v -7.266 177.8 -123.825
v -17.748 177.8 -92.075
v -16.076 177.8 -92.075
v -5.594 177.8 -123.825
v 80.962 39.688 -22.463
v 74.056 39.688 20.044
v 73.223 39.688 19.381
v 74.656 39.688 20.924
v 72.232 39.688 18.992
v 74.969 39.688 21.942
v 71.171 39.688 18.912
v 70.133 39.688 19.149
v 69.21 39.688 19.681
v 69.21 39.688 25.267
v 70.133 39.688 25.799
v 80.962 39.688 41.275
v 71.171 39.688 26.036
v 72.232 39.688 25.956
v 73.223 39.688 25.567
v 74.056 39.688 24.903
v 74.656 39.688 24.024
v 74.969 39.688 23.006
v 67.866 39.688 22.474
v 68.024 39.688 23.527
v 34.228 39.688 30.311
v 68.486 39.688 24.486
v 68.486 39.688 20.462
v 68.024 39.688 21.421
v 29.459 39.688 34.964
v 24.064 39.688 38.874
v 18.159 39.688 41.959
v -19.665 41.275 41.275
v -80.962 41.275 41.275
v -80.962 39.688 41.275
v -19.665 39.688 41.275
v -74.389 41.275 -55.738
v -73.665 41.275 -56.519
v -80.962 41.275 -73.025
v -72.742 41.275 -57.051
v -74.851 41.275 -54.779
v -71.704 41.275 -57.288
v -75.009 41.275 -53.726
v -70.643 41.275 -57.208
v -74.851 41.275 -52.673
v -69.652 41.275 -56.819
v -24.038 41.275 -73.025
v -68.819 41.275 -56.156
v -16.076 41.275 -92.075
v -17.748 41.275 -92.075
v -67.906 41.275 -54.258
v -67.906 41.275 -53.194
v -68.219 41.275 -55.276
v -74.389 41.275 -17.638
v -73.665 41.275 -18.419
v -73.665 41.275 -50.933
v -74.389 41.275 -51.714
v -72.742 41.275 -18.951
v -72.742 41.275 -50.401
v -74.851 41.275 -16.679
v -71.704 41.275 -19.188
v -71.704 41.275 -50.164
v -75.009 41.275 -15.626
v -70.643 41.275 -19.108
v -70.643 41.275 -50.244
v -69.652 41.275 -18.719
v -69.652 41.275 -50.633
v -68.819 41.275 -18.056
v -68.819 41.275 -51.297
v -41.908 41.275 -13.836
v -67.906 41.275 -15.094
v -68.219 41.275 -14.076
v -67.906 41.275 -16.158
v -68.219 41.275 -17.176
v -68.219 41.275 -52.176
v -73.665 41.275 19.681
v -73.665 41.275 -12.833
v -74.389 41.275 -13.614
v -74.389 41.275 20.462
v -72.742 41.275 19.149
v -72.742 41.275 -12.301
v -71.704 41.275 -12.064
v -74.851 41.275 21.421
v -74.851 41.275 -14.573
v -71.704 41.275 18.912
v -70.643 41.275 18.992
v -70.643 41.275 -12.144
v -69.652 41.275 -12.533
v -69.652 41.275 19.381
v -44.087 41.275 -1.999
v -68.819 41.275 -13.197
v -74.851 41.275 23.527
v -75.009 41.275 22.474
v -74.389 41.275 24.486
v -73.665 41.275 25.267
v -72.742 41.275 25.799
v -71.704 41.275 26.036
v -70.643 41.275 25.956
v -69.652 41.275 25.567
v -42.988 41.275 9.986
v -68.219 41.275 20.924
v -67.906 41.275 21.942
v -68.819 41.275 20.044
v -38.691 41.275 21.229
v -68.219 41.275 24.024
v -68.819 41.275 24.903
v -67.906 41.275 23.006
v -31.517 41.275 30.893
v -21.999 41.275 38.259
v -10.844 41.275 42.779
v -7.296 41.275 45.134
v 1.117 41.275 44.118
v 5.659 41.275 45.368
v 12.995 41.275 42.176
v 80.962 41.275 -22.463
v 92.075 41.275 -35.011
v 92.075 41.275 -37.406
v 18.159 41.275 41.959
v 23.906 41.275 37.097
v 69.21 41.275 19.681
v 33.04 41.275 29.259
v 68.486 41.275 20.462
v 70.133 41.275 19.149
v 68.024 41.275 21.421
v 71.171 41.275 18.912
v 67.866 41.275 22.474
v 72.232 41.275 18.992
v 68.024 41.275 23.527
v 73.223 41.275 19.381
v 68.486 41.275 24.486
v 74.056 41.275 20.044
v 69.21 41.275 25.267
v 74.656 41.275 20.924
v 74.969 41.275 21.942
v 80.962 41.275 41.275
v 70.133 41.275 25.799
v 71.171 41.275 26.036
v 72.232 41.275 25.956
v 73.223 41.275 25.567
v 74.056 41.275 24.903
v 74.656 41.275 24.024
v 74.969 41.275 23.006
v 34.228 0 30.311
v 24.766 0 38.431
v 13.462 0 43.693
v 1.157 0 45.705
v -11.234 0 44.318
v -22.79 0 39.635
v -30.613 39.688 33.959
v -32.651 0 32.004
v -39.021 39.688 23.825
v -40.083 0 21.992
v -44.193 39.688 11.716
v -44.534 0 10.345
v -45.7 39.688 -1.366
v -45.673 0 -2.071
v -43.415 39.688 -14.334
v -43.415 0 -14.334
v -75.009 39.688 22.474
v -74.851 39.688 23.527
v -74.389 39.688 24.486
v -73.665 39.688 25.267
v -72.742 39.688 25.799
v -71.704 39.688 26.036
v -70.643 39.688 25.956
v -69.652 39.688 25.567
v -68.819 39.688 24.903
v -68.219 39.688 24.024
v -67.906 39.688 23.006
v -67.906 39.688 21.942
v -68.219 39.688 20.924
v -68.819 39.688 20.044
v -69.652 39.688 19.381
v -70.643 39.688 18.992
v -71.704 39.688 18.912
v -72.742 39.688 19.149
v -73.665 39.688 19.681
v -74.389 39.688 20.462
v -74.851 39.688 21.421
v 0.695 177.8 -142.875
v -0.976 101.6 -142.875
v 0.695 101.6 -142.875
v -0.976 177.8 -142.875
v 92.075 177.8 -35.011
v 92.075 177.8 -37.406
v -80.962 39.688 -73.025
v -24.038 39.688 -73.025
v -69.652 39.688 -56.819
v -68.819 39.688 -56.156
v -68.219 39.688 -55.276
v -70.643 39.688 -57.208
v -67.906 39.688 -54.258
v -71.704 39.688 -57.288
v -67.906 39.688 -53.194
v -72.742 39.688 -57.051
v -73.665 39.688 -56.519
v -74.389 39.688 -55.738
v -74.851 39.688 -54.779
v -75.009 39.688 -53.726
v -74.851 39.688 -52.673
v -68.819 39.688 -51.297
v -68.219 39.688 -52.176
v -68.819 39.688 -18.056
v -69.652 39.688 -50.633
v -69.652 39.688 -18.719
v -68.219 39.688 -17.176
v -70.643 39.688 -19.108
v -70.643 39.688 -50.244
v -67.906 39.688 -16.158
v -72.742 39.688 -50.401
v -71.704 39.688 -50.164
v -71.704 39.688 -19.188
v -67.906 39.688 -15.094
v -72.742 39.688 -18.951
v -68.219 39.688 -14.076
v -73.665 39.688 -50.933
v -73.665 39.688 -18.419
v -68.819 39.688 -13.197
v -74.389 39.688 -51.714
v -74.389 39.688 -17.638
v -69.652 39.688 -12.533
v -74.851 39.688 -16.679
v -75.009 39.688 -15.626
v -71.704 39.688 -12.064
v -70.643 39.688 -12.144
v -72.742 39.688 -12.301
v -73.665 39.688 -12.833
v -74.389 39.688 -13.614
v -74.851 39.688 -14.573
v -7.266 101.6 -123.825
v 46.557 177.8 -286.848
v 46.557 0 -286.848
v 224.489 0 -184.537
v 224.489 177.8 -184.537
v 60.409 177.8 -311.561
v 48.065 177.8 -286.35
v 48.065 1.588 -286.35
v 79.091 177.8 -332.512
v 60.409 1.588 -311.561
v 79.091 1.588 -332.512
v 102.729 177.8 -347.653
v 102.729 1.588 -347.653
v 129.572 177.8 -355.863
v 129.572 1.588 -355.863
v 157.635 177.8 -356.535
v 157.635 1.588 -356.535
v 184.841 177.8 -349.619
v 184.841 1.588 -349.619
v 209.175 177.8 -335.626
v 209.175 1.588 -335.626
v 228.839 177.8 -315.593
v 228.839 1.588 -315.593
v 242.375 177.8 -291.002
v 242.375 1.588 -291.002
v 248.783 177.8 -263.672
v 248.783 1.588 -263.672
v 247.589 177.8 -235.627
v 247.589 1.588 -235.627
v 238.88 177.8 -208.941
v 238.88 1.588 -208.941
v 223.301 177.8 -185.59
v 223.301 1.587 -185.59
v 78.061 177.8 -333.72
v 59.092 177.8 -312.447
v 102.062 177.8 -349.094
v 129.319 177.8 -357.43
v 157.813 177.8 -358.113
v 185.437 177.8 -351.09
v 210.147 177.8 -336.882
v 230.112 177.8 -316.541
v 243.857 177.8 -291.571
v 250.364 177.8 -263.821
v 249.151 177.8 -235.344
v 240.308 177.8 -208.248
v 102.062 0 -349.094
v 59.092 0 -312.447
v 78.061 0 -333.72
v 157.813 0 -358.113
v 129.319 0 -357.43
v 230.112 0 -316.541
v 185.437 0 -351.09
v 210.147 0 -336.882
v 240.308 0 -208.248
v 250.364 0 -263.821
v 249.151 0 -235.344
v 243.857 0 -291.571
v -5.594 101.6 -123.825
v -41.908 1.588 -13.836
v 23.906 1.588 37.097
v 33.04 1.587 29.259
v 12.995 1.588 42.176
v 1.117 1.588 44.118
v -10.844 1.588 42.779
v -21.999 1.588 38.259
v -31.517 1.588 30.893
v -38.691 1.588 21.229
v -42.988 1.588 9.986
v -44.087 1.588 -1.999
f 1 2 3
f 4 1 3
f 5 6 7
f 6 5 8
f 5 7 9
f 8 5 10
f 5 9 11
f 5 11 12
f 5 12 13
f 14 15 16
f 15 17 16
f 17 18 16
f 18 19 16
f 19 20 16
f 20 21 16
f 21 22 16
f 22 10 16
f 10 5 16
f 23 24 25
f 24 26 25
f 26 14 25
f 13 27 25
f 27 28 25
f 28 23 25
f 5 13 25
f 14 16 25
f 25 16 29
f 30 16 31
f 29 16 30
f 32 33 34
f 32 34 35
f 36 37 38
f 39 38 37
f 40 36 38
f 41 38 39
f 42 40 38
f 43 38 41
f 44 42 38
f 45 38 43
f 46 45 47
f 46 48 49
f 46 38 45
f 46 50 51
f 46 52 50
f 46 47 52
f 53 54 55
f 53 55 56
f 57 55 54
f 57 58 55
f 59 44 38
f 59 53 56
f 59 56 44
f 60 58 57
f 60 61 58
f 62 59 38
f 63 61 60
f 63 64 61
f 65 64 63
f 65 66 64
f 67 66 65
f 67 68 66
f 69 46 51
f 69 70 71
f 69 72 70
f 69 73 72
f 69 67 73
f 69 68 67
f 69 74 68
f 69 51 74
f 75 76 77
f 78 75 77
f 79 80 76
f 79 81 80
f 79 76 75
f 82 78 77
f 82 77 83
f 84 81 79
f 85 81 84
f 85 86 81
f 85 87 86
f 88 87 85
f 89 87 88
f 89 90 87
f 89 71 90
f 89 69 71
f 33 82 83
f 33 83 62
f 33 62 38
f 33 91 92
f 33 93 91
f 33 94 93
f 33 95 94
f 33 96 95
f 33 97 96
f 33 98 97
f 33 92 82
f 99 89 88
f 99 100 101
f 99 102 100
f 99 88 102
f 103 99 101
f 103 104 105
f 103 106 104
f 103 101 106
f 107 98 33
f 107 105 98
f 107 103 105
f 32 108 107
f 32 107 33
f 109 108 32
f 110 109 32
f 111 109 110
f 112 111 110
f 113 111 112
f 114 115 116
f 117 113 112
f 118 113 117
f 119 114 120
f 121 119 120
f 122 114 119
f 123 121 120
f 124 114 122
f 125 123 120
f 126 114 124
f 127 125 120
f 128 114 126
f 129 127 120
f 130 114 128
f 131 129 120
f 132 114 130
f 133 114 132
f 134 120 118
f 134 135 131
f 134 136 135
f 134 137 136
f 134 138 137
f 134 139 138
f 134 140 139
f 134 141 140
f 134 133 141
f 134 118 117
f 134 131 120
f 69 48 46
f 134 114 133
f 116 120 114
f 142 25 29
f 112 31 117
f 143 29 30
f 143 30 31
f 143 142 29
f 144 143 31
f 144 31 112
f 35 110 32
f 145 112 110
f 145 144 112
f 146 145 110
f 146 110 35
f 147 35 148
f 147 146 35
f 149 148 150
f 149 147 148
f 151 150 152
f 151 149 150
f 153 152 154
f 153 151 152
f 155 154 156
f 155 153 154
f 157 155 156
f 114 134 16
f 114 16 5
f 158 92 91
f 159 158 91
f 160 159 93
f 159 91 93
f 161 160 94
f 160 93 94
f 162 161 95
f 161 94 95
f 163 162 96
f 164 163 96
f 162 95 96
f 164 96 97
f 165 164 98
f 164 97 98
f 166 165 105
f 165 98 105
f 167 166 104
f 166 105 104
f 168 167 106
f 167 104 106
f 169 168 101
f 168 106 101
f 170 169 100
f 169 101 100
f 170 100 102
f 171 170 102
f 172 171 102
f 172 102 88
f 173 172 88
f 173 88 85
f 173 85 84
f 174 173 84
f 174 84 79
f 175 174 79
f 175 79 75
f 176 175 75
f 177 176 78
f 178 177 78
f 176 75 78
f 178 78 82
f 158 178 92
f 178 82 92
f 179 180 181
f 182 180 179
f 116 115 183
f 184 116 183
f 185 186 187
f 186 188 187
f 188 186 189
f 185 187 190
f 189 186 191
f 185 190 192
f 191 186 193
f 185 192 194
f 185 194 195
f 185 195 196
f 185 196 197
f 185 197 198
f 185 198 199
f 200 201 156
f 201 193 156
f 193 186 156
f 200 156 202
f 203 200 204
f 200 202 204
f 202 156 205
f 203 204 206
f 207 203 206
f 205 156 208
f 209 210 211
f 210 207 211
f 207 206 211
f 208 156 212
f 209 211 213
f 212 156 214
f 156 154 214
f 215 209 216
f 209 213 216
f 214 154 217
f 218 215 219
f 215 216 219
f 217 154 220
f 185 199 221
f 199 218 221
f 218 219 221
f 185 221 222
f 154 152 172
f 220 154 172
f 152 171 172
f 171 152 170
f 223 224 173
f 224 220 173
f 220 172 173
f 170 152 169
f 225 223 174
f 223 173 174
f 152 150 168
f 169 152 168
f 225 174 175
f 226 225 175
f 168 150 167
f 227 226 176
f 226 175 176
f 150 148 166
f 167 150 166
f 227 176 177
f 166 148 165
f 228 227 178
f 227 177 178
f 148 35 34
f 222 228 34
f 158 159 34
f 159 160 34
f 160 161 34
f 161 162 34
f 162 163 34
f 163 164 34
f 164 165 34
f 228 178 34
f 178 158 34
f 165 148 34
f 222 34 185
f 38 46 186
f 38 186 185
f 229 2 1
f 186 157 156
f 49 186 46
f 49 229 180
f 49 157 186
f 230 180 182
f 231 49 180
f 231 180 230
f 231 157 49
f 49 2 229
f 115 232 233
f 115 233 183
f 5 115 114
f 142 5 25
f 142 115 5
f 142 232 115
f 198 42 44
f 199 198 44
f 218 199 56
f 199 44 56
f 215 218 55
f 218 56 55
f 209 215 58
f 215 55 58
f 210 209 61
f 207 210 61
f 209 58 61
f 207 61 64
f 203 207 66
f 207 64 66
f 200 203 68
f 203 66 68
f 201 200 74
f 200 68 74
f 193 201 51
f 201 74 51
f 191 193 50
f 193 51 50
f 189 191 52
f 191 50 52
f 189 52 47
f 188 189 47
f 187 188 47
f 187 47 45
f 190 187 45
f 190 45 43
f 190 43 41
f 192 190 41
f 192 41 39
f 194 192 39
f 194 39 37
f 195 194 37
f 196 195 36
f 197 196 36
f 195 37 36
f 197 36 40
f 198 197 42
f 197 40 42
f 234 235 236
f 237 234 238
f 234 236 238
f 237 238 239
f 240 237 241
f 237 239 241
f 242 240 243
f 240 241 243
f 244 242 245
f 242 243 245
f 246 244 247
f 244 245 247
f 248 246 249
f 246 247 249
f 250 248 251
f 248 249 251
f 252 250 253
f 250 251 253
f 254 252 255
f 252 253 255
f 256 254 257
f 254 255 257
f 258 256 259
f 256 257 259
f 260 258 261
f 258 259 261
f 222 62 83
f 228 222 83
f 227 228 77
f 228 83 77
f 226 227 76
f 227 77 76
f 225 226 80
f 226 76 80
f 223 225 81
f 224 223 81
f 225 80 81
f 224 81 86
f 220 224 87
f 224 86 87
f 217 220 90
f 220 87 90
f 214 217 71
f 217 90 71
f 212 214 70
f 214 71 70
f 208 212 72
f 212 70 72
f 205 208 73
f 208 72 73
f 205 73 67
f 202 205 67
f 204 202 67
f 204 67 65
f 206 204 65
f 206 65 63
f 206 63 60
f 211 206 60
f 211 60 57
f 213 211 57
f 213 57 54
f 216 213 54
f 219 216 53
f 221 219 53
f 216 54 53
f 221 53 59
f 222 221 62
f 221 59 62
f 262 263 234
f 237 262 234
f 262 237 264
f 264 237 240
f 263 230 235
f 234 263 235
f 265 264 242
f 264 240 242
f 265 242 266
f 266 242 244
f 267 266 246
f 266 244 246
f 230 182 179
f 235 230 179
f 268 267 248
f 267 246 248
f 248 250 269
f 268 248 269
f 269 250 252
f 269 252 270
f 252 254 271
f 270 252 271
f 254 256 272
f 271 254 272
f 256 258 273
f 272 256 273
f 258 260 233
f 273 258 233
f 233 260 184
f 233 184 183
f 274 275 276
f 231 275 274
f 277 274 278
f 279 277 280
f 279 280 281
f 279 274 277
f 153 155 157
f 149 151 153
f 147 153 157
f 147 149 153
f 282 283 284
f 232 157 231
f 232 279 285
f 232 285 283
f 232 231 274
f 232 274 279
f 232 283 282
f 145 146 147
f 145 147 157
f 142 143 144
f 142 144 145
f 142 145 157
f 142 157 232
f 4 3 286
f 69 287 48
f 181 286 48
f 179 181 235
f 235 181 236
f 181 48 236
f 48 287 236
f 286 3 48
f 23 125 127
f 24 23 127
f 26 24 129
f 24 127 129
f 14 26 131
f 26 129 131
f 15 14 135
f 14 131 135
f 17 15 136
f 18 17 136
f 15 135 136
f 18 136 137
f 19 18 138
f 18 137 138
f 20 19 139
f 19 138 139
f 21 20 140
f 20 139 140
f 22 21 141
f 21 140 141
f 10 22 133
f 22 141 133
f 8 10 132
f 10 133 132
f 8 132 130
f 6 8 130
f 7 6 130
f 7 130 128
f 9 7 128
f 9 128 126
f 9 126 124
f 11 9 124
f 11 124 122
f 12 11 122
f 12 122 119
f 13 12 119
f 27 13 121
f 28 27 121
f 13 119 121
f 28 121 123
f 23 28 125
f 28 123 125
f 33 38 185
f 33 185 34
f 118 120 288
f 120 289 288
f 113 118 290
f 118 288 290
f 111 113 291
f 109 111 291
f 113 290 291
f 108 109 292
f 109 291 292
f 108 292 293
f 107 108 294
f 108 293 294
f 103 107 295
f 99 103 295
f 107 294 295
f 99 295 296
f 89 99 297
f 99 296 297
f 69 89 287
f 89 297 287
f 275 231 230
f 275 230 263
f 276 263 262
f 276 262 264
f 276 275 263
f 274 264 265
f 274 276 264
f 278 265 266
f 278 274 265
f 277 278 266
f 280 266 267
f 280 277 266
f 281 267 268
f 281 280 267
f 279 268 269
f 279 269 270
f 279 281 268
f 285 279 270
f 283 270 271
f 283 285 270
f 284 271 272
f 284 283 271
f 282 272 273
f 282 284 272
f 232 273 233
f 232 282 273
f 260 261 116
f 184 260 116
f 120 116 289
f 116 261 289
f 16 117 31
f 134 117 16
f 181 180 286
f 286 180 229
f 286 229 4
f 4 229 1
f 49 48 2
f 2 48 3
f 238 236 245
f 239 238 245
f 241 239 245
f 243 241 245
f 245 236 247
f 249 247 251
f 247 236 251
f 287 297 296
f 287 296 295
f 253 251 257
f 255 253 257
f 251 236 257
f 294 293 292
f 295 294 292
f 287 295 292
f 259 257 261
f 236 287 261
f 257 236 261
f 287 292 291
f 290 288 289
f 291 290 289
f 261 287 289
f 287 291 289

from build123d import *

# Parameters (mm, degrees)
F1_DEPTH  = 177.8
F3_T      = -1.5875
F4_W      = 201.5869445521
F4_H      = 226.8152372871
F5_DEPTH  = 137.796
F6_R      = 3.571875
F7_DEPTH  = 1.5875
F9_W      = 76.2
F9_H      = 19.05
F10_DEPTH = 154.0954613767


with BuildPart() as f1:
    # F0 (on Front) → F1 (new body)
    with BuildSketch(Plane.XZ):
        with BuildLine():
            Line((224.489292991, -184.5372190302), (34.2280551234, 30.3110316959))
            ThreePointArc((34.2280551234, 30.3110316959), (-22.7900998011, 39.6349561758), (-43.415004865, -14.3337277974))
            Line((-43.415004865, -14.3337277974), (46.5572805176, -286.8481262024))
            ThreePointArc((46.5572805176, -286.8481262024), (198.2773120441, -344.8301079029), (224.489292991, -184.5372190302))
        make_face()
    extrude(amount=-F1_DEPTH)

    # F3
    f3_openings = [f1.faces().sort_by_distance(p)[0] for p in [
        (100.456199, 177.8, -174.706432),
    ]]
    offset(amount=F3_T, openings=f3_openings)

    # F4 (on offset) → F5 (cut, through all)
    with BuildSketch(Plane.YZ.offset(92.075)):
        with Locations((142.068472276, 21.3326186436)):
            Rectangle(F4_W, F4_H)
    extrude(amount=-F5_DEPTH, mode=Mode.SUBTRACT)

    # F6 (on face) → F7 (join)
    with BuildSketch(Plane(origin=(0, 41.275, 0), x_dir=(-1, 0, 0), z_dir=(0, 1, 0))):
        with BuildLine():
            Line((-13.52243099, 42.0097776282), (-80.9625, 41.275))
            Line((-80.9625, 41.275), (-80.9625, -24.8573199515))
            Line((-80.9625, -24.8573199515), (-33.0395809871, 29.2585653176))
            ThreePointArc((-33.0395809871, 29.2585653176), (-24.1382185276, 36.9462306949), (-13.52243099, 42.0097776282))
        make_face()
        with Locations((-71.4375, 22.47392)):
            Circle(F6_R, mode=Mode.SUBTRACT)
        with BuildLine():
            Line((80.9625, -73.025), (80.9625, 41.275))
            Line((80.9625, 41.275), (15.6221615422, 41.275))
            ThreePointArc((15.6221615422, 41.275), (39.833691772, 18.9988040694), (41.9075394183, -13.8360289155))
            Line((41.9075394183, -13.8360289155), (22.3659407759, -73.025))
            Line((22.3659407759, -73.025), (80.9625, -73.025))
        make_face()
        with Locations((71.4375, -53.72608)):
            Circle(F6_R, mode=Mode.SUBTRACT)
        with Locations((71.4375, -15.62608)):
            Circle(F6_R, mode=Mode.SUBTRACT)
        with Locations((71.4375, 22.47392)):
            Circle(F6_R, mode=Mode.SUBTRACT)
    extrude(amount=-F7_DEPTH)

    # F9 (on offset) → F10 (cut, up to face)
    with BuildSketch(Plane.YZ.offset(-152.4)):
        with Locations((139.7, -133.35)):
            Rectangle(F9_W, F9_H)
    extrude(amount=F10_DEPTH, mode=Mode.SUBTRACT)


solid = f1.part
